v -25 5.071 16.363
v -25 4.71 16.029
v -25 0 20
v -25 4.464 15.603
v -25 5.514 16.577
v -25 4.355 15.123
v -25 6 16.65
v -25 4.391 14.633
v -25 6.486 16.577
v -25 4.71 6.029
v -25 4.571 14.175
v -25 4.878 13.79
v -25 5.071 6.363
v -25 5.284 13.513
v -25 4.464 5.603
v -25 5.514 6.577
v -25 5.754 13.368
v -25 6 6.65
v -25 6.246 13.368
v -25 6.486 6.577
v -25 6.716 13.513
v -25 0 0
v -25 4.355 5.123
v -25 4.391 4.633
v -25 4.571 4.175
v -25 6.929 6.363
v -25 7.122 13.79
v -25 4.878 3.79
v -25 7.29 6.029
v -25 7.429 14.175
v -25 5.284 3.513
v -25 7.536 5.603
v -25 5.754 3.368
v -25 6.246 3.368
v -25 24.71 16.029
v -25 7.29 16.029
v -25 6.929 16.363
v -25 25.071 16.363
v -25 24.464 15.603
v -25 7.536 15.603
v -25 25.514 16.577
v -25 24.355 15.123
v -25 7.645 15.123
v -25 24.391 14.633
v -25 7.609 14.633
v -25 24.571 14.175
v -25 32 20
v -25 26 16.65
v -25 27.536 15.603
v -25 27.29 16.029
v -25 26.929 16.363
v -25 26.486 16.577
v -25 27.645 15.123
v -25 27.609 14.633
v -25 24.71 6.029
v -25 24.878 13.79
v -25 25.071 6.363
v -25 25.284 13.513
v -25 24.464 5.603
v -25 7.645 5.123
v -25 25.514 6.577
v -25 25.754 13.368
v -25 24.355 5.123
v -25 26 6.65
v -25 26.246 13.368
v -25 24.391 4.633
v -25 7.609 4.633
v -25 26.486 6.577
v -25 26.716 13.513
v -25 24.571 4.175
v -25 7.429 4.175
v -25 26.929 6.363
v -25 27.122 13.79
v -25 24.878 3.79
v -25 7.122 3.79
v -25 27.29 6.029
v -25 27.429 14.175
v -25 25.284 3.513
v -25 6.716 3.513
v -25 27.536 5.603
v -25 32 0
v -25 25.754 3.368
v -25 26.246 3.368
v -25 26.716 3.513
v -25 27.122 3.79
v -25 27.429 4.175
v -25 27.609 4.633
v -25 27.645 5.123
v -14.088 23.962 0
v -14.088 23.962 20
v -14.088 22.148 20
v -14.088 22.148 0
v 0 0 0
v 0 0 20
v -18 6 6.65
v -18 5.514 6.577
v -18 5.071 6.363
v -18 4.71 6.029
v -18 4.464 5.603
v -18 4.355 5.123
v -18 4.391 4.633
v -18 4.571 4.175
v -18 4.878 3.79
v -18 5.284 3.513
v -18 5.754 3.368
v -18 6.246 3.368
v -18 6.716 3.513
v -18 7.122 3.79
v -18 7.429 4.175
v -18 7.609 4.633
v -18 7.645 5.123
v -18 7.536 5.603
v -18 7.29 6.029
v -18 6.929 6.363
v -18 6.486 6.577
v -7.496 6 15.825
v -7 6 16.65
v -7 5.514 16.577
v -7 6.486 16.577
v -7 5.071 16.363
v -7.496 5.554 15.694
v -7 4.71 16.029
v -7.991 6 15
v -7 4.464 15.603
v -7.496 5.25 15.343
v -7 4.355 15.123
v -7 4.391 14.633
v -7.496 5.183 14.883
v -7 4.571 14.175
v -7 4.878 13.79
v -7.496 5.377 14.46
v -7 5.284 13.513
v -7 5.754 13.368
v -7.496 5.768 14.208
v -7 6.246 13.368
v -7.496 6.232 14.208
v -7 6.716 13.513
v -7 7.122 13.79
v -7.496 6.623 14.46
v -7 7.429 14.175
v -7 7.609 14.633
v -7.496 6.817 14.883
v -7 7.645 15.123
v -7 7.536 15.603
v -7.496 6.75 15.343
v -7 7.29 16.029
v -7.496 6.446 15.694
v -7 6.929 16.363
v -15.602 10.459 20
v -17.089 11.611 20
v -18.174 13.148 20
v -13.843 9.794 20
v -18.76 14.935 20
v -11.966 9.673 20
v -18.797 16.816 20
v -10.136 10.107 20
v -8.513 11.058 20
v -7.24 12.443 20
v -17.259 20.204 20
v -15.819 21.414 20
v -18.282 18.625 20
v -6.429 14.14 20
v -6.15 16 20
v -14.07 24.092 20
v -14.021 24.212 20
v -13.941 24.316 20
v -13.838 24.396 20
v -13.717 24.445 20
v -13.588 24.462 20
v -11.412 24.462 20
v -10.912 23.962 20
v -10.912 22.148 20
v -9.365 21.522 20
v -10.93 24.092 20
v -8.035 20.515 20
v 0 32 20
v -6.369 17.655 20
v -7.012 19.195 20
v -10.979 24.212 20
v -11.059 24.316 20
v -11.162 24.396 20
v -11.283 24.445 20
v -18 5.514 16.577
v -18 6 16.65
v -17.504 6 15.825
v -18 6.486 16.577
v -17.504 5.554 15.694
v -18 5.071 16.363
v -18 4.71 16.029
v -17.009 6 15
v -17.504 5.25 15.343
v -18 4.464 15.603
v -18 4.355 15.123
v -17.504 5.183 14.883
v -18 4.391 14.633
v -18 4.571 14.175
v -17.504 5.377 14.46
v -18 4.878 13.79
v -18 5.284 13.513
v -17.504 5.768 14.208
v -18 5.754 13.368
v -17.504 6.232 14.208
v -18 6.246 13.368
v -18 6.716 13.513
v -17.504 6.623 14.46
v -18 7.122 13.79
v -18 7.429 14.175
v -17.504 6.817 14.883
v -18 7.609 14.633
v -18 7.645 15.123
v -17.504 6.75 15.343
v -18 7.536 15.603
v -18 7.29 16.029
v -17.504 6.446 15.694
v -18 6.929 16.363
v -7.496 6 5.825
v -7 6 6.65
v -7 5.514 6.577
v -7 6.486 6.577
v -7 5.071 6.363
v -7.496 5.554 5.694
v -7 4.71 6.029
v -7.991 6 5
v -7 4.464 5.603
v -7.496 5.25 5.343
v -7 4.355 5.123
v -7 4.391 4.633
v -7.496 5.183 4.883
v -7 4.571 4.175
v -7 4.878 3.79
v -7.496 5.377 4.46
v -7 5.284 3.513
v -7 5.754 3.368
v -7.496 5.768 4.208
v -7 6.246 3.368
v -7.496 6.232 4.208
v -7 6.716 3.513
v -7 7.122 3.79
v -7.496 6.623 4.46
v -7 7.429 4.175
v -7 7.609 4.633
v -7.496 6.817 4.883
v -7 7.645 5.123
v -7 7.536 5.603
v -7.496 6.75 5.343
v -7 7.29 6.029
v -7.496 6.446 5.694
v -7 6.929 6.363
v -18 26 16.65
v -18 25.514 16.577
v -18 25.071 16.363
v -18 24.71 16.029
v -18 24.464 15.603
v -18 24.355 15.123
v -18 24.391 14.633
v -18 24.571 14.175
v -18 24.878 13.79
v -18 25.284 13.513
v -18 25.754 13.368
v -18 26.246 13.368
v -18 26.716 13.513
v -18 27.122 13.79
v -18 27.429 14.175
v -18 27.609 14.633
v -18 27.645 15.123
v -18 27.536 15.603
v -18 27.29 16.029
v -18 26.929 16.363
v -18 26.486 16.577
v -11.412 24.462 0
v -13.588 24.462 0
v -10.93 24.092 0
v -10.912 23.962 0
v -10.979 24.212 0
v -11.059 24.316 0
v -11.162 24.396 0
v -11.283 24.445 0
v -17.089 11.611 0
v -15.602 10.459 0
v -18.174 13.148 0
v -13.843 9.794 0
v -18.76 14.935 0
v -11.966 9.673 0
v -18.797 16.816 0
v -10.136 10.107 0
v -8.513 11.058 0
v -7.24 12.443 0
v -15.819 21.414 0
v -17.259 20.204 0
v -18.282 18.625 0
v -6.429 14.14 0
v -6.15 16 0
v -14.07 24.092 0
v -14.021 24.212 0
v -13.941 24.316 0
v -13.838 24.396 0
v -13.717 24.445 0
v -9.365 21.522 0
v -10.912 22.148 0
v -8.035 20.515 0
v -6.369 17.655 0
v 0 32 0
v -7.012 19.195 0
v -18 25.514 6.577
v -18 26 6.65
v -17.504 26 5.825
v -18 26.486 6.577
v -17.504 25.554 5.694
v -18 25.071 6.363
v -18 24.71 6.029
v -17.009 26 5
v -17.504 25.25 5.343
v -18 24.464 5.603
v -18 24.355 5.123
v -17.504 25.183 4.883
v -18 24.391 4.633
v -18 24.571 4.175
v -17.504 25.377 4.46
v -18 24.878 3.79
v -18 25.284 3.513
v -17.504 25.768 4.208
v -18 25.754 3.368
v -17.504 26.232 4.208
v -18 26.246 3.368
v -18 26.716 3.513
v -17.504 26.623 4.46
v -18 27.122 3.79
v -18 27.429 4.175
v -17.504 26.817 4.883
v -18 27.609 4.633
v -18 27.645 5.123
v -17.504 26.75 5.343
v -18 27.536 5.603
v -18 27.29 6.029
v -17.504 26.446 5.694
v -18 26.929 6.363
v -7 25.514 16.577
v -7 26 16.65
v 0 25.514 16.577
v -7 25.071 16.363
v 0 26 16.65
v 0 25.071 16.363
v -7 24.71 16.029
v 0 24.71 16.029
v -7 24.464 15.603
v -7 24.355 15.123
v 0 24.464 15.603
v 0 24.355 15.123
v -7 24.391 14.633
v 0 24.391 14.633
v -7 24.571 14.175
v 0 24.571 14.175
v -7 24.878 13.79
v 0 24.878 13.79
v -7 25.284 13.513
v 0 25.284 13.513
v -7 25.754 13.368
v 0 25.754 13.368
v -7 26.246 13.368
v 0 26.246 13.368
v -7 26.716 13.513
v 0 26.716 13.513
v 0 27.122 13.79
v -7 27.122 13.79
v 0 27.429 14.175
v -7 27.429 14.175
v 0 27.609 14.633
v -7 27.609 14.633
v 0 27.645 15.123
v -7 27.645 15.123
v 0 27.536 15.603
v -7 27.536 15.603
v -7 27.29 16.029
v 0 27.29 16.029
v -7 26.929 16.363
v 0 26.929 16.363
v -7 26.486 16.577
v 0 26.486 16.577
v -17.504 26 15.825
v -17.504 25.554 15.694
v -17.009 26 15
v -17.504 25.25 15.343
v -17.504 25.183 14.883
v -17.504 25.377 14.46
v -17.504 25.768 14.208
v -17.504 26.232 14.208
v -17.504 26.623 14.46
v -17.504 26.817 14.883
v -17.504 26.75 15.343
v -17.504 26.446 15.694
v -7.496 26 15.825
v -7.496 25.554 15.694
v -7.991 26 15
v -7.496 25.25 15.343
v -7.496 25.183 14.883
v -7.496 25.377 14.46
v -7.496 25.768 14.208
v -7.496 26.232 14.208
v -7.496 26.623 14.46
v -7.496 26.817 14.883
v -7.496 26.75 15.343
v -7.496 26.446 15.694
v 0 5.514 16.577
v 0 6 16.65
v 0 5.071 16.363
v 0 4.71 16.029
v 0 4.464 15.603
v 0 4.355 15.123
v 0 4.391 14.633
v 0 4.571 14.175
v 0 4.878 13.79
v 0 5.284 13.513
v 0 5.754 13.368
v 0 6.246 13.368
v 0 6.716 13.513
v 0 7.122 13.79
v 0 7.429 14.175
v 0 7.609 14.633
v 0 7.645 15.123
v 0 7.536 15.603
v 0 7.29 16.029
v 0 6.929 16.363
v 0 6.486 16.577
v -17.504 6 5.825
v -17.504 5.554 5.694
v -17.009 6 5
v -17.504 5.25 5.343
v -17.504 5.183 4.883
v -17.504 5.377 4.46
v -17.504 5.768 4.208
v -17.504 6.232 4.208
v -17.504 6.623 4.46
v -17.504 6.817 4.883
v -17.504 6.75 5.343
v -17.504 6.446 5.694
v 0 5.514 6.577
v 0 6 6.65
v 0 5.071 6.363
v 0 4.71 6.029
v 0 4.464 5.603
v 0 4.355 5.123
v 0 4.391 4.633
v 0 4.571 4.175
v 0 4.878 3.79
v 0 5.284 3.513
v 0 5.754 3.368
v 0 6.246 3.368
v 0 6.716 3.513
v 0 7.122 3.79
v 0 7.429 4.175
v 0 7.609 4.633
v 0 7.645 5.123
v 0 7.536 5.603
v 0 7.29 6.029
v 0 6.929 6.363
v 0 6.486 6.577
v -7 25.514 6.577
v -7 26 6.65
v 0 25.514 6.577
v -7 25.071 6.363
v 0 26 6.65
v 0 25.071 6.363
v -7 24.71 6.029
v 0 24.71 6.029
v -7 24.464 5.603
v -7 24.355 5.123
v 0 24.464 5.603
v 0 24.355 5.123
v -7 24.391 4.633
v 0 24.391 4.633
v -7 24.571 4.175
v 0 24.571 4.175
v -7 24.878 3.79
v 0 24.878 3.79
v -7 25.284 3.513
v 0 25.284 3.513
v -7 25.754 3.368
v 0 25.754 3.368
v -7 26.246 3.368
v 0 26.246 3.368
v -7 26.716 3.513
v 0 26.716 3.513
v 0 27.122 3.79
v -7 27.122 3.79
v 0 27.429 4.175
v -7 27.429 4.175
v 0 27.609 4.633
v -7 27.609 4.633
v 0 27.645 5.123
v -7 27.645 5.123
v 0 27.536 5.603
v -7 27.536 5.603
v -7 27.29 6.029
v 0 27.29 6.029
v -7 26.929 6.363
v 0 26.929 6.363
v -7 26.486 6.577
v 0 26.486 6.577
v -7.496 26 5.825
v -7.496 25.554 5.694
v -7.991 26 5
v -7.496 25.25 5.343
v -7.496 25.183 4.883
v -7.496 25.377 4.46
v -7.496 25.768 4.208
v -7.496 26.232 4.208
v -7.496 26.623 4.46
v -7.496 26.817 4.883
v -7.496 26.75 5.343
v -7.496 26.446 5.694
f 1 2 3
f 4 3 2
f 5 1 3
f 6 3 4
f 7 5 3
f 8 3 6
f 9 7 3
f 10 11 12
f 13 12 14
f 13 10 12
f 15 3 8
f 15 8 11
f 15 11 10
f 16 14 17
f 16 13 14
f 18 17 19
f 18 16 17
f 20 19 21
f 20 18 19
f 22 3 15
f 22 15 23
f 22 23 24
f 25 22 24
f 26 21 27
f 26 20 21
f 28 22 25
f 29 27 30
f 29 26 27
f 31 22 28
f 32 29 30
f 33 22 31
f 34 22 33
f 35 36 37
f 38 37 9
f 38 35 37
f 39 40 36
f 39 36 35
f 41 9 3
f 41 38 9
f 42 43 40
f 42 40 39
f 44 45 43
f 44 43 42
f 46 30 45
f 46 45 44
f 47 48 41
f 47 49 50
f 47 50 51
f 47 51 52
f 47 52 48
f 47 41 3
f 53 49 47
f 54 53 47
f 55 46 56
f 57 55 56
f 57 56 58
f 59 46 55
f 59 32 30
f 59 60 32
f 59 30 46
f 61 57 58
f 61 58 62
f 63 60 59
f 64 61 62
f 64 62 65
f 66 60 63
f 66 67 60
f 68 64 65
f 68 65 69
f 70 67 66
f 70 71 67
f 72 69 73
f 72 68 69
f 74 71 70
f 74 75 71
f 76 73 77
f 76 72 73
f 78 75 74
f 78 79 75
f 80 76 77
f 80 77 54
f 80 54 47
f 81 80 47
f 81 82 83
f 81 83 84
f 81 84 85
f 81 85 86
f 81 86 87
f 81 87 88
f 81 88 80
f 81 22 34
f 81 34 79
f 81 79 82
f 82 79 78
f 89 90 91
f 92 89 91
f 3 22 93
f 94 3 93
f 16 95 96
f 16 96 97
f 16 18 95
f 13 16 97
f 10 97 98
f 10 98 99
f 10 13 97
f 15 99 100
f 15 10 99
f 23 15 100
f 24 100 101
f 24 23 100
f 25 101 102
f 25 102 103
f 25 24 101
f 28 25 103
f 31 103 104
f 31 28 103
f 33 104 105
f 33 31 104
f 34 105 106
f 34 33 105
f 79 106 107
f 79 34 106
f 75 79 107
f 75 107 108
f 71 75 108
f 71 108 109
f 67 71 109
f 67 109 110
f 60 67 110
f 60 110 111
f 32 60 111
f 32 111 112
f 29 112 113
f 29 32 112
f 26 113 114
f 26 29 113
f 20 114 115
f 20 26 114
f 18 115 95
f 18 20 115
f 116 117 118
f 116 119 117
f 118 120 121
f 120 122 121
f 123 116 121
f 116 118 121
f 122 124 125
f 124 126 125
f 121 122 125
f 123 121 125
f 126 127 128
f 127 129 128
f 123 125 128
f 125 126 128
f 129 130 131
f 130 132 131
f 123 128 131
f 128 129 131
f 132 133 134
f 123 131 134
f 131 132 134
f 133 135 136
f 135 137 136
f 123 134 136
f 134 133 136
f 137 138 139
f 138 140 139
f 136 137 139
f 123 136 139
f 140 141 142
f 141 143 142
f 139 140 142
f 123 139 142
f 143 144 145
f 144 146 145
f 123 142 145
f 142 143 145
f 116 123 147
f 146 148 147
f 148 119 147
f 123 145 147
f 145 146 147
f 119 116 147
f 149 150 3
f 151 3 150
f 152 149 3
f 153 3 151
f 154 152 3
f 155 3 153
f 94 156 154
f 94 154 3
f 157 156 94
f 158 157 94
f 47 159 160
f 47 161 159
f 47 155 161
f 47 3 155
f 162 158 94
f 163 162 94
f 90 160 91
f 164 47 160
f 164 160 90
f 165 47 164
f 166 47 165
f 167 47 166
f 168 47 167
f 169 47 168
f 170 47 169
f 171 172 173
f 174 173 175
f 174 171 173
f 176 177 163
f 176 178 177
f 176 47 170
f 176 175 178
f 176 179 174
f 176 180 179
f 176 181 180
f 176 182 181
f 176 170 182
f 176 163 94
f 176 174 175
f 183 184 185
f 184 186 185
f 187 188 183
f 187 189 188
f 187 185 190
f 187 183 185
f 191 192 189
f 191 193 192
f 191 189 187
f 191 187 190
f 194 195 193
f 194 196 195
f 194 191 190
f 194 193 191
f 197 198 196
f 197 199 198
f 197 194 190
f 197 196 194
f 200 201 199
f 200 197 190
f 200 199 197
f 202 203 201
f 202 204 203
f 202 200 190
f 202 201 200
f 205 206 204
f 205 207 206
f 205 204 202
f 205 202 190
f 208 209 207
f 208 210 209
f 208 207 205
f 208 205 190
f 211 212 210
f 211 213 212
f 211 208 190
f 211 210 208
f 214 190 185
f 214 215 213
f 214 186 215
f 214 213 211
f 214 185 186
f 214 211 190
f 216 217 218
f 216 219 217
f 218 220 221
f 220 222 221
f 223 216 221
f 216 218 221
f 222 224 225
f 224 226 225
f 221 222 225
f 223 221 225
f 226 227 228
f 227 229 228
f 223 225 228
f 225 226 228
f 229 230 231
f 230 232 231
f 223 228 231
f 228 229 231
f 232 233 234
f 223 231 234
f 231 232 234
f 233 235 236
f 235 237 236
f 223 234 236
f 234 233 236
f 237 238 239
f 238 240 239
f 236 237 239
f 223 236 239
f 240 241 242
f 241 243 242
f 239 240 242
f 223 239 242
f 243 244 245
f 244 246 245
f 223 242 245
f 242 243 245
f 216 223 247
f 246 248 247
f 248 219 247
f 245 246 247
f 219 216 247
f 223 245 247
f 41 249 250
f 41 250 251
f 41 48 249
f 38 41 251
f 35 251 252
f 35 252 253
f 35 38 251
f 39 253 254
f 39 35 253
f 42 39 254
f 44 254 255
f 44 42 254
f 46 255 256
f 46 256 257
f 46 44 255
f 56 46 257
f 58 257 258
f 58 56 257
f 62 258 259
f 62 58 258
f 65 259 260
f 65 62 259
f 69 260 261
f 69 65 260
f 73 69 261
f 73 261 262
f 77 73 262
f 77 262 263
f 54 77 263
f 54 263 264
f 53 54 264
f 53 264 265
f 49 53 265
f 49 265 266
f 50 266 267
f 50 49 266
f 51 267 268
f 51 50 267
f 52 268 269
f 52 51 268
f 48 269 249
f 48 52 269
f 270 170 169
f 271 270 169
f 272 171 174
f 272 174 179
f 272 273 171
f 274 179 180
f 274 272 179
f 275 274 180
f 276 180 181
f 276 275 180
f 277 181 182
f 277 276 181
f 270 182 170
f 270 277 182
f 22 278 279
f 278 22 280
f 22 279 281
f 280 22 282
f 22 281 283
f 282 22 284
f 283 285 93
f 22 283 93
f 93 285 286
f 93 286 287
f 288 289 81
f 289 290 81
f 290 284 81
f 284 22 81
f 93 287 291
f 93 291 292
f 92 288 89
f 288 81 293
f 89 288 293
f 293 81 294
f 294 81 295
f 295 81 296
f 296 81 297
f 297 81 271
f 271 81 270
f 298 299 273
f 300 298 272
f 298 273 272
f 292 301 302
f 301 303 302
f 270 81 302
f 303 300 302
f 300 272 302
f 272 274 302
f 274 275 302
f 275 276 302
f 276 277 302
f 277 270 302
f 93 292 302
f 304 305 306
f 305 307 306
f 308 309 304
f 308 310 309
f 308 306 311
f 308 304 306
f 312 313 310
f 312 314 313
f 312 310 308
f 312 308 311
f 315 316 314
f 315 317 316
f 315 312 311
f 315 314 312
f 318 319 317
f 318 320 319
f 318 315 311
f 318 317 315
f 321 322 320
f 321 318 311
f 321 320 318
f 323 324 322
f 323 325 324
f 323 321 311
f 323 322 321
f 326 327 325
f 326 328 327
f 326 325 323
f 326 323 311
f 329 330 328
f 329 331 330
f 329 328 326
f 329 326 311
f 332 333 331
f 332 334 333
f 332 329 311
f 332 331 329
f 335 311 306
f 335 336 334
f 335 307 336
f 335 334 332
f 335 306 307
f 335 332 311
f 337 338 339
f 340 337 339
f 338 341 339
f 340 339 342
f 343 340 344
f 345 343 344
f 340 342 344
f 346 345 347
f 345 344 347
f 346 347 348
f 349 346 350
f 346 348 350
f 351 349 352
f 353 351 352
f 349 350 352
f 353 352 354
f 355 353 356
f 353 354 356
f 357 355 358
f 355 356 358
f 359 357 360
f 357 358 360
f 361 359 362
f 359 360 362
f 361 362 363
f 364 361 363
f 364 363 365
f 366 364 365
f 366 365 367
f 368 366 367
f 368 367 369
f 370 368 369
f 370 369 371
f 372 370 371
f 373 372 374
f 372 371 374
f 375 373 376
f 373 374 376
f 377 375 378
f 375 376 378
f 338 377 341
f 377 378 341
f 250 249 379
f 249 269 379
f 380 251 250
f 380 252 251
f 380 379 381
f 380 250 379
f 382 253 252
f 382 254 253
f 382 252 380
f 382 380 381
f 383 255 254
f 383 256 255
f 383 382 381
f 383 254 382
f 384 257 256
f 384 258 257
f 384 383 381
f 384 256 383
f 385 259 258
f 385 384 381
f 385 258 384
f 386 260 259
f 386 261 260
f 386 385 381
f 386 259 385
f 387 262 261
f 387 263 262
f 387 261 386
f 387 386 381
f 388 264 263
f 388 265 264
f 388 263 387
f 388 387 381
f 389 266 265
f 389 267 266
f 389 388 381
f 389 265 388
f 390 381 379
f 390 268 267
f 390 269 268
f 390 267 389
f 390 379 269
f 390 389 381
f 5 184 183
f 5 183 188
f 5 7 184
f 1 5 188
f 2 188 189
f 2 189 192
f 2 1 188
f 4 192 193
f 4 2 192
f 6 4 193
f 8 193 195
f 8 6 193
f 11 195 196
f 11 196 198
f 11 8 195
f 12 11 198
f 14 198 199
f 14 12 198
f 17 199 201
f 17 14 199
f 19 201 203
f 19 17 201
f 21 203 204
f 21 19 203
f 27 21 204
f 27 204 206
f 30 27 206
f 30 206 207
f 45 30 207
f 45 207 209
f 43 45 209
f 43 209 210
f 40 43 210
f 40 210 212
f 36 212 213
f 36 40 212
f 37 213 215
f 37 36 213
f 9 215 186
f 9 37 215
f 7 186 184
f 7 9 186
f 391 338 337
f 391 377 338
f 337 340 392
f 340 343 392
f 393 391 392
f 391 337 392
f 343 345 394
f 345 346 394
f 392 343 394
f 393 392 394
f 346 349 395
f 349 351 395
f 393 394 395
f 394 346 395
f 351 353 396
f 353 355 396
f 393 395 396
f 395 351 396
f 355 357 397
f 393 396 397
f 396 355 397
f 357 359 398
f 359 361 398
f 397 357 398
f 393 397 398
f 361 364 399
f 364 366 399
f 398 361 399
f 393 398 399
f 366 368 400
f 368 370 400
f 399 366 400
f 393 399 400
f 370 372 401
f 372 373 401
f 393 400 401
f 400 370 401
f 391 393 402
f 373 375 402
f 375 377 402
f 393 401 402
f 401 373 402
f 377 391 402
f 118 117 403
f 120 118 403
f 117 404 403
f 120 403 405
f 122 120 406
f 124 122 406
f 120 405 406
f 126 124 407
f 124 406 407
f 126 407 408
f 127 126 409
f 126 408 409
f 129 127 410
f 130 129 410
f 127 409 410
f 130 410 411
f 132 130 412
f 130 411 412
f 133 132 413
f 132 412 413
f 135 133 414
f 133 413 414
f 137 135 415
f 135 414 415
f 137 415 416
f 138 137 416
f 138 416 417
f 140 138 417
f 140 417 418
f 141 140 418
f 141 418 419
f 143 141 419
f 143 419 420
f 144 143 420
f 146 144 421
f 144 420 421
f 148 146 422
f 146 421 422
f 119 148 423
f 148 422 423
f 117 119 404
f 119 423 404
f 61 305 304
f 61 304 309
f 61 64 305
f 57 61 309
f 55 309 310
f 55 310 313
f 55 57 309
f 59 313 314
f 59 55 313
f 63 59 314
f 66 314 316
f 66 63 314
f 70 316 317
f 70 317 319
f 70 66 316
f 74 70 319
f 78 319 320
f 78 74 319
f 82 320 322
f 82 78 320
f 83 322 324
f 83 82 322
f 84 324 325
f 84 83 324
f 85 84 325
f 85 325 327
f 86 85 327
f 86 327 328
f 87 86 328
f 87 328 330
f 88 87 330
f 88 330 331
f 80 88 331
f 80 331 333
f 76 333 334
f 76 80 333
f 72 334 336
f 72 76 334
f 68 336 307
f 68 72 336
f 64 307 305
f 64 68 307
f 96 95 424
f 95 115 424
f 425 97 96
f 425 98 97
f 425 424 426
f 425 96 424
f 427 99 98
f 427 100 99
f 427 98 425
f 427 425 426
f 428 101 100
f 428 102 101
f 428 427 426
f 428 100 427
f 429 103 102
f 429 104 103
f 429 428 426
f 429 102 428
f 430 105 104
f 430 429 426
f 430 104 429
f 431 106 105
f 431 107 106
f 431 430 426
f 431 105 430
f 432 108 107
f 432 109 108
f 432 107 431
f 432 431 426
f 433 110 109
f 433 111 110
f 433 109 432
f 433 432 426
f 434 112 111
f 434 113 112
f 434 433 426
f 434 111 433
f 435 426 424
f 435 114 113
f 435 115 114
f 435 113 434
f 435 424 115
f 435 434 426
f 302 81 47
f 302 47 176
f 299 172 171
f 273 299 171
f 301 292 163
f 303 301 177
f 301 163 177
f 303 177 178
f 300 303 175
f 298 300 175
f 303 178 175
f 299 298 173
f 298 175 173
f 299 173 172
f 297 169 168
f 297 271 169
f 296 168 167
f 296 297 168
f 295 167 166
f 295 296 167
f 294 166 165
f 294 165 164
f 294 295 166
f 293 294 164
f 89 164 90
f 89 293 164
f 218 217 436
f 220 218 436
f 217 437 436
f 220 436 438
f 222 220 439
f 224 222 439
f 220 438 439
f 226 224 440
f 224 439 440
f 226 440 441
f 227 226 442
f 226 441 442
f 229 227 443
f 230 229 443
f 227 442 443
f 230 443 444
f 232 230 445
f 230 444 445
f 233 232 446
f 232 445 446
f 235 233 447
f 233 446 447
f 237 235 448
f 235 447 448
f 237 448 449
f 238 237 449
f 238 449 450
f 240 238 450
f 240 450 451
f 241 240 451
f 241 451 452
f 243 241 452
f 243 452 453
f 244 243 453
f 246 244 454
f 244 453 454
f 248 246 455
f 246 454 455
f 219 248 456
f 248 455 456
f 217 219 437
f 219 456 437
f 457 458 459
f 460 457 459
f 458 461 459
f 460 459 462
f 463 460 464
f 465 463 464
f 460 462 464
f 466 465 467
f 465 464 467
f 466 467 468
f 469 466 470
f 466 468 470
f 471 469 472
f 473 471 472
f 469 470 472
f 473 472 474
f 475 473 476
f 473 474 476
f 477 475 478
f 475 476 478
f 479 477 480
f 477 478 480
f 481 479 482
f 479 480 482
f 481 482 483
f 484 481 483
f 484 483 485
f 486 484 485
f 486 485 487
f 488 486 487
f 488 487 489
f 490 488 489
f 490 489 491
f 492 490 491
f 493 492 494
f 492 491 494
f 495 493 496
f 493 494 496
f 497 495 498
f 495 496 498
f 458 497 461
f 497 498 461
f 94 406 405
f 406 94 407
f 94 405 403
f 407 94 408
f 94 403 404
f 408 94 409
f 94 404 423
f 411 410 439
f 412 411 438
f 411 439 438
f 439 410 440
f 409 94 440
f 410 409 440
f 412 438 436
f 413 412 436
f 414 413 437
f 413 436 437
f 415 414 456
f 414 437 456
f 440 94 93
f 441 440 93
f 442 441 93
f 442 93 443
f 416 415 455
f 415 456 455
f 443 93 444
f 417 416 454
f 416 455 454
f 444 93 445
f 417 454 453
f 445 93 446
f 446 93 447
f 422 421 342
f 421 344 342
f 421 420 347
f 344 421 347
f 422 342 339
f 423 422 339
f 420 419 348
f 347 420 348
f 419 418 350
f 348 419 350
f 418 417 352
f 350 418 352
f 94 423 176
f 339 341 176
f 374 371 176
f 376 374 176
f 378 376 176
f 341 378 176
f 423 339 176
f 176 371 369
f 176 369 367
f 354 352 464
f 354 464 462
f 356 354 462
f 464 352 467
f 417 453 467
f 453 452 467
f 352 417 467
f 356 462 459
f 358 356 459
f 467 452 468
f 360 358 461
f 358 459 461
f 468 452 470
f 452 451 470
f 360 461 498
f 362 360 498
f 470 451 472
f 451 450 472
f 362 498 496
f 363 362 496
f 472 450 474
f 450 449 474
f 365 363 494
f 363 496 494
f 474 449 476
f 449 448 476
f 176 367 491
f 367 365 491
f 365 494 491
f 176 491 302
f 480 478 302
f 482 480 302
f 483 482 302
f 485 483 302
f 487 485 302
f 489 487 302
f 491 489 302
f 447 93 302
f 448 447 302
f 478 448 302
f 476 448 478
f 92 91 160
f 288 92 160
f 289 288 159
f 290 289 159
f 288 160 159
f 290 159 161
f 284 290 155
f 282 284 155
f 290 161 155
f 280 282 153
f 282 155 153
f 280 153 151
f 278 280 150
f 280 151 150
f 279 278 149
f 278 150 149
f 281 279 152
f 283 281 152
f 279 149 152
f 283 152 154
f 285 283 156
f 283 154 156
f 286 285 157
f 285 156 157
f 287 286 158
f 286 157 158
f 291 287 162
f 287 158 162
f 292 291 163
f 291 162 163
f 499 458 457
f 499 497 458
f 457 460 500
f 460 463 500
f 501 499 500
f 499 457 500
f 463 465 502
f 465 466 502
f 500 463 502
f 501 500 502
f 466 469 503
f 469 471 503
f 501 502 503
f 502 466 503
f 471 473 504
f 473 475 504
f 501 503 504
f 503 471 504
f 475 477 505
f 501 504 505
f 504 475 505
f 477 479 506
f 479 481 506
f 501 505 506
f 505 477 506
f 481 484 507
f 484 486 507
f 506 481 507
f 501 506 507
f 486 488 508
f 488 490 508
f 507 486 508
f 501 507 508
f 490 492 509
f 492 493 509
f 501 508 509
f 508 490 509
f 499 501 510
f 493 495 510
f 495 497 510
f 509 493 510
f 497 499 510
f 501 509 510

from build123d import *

# Parameters (mm, degrees)
SKETCH1_W                      = 25
SKETCH1_H                      = 32
BOSS_EXTRUDE1_DEPTH            = 20
CUT_EXTRUDE1_DEPTH             = 46.265881191
M4X0_7_TAPPED_HOLE1_AT_2_COUNT = 2
M4X0_7_TAPPED_HOLE1_AT_2_PITCH = 22.360679775
M4X0_7_TAPPED_HOLE1_AT_3_COUNT = 2
M4X0_7_TAPPED_HOLE1_AT_3_PITCH = 20
M4X0_7_TAPPED_HOLE1_AT_4_COUNT = 2
M4X0_7_TAPPED_HOLE1_AT_4_PITCH = 10
FILLET1_R                      = 0.5


with BuildPart() as part:
    # Sketch1 → Boss-Extrude1 (new body)
    with BuildSketch(Plane.XY):
        with Locations((-12.5, 16)):
            Rectangle(SKETCH1_W, SKETCH1_H)
    extrude(amount=BOSS_EXTRUDE1_DEPTH)

    # Sketch2 → Cut-Extrude1 (cut, through all)
    with BuildSketch(Plane.XY.offset(20)):
        with BuildLine():
            Line((-10.9125, 24.4625), (-14.0875, 24.4625))
            Line((-14.0875, 24.4625), (-14.0875, 22.148361062))
            ThreePointArc((-14.0875, 22.148361062), (-12.5, 9.65), (-10.9125, 22.148361062))
            Line((-10.9125, 22.148361062), (-10.9125, 24.4625))
        make_face()
    extrude(amount=-CUT_EXTRUDE1_DEPTH, mode=Mode.SUBTRACT)

    # Sketch4 → M4x0.7 Tapped Hole1 (revolve, cut)
    with BuildSketch(Plane(origin=(-25, 26, 5), x_dir=(0, 0, 1), z_dir=(0, 1, 0))):
        Polygon((0, 0), (0, 7.991420021), (1.65, 7), (1.65, 0), align=None)
    m4x0_7_tapped_hole1 = revolve(axis=Axis((-31.35, 26, 5), (1, 0, 0)), mode=Mode.SUBTRACT)

    # M4x0.7 Tapped Hole1 at 2: M4x0.7 Tapped Hole1 ×2
    with Locations(*[Vector(0, -0.894427190999916, 0.44721359549995787) * (i * M4X0_7_TAPPED_HOLE1_AT_2_PITCH) for i in range(1, M4X0_7_TAPPED_HOLE1_AT_2_COUNT)]):
        add(m4x0_7_tapped_hole1, mode=Mode.SUBTRACT)

    # M4x0.7 Tapped Hole1 at 3: M4x0.7 Tapped Hole1 ×2
    with Locations(*[(0, -i * M4X0_7_TAPPED_HOLE1_AT_3_PITCH, 0) for i in range(1, M4X0_7_TAPPED_HOLE1_AT_3_COUNT)]):
        add(m4x0_7_tapped_hole1, mode=Mode.SUBTRACT)

    # M4x0.7 Tapped Hole1 at 4: M4x0.7 Tapped Hole1 ×2
    with Locations(*[(0, 0, i * M4X0_7_TAPPED_HOLE1_AT_4_PITCH) for i in range(1, M4X0_7_TAPPED_HOLE1_AT_4_COUNT)]):
        add(m4x0_7_tapped_hole1, mode=Mode.SUBTRACT)

    # Mirror1: M4x0.7 Tapped Hole1 across plane
    add(m4x0_7_tapped_hole1.mirror(Plane.ZY.offset(12.5)), mode=Mode.SUBTRACT)

    # Mirror1 copy 1 sketch → Mirror1 copy 1 (revolve, cut)
    with BuildSketch(Plane(origin=(0, 6, 15), x_dir=(0, 0, 1), z_dir=(0, 1, 0))):
        Polygon((0, 0), (0, -7.991420021), (1.65, -7), (1.65, 0), align=None)
    revolve(axis=Axis((6.35, 6, 15), (1, 0, 0)), mode=Mode.SUBTRACT)

    # Mirror1 copy 2 sketch → Mirror1 copy 2 (revolve, cut)
    with BuildSketch(Plane(origin=(0, 6, 5), x_dir=(0, 0, 1), z_dir=(0, 1, 0))):
        Polygon((0, 0), (0, -7.991420021), (1.65, -7), (1.65, 0), align=None)
    revolve(axis=Axis((6.35, 6, 5), (1, 0, 0)), mode=Mode.SUBTRACT)

    # Mirror1 copy 3 sketch → Mirror1 copy 3 (revolve, cut)
    with BuildSketch(Plane(origin=(0, 26, 15), x_dir=(0, 0, 1), z_dir=(0, 1, 0))):
        Polygon((0, 0), (0, -7.991420021), (1.65, -7), (1.65, 0), align=None)
    revolve(axis=Axis((6.35, 26, 15), (1, 0, 0)), mode=Mode.SUBTRACT)

    # Fillet1
    fillet1_edges = [part.edges().sort_by_distance(p)[0] for p in [
        (-10.9125, 24.4625, 10),
        (-14.0875, 24.4625, 10),
    ]]
    fillet(fillet1_edges, radius=FILLET1_R)


solid = part.part
